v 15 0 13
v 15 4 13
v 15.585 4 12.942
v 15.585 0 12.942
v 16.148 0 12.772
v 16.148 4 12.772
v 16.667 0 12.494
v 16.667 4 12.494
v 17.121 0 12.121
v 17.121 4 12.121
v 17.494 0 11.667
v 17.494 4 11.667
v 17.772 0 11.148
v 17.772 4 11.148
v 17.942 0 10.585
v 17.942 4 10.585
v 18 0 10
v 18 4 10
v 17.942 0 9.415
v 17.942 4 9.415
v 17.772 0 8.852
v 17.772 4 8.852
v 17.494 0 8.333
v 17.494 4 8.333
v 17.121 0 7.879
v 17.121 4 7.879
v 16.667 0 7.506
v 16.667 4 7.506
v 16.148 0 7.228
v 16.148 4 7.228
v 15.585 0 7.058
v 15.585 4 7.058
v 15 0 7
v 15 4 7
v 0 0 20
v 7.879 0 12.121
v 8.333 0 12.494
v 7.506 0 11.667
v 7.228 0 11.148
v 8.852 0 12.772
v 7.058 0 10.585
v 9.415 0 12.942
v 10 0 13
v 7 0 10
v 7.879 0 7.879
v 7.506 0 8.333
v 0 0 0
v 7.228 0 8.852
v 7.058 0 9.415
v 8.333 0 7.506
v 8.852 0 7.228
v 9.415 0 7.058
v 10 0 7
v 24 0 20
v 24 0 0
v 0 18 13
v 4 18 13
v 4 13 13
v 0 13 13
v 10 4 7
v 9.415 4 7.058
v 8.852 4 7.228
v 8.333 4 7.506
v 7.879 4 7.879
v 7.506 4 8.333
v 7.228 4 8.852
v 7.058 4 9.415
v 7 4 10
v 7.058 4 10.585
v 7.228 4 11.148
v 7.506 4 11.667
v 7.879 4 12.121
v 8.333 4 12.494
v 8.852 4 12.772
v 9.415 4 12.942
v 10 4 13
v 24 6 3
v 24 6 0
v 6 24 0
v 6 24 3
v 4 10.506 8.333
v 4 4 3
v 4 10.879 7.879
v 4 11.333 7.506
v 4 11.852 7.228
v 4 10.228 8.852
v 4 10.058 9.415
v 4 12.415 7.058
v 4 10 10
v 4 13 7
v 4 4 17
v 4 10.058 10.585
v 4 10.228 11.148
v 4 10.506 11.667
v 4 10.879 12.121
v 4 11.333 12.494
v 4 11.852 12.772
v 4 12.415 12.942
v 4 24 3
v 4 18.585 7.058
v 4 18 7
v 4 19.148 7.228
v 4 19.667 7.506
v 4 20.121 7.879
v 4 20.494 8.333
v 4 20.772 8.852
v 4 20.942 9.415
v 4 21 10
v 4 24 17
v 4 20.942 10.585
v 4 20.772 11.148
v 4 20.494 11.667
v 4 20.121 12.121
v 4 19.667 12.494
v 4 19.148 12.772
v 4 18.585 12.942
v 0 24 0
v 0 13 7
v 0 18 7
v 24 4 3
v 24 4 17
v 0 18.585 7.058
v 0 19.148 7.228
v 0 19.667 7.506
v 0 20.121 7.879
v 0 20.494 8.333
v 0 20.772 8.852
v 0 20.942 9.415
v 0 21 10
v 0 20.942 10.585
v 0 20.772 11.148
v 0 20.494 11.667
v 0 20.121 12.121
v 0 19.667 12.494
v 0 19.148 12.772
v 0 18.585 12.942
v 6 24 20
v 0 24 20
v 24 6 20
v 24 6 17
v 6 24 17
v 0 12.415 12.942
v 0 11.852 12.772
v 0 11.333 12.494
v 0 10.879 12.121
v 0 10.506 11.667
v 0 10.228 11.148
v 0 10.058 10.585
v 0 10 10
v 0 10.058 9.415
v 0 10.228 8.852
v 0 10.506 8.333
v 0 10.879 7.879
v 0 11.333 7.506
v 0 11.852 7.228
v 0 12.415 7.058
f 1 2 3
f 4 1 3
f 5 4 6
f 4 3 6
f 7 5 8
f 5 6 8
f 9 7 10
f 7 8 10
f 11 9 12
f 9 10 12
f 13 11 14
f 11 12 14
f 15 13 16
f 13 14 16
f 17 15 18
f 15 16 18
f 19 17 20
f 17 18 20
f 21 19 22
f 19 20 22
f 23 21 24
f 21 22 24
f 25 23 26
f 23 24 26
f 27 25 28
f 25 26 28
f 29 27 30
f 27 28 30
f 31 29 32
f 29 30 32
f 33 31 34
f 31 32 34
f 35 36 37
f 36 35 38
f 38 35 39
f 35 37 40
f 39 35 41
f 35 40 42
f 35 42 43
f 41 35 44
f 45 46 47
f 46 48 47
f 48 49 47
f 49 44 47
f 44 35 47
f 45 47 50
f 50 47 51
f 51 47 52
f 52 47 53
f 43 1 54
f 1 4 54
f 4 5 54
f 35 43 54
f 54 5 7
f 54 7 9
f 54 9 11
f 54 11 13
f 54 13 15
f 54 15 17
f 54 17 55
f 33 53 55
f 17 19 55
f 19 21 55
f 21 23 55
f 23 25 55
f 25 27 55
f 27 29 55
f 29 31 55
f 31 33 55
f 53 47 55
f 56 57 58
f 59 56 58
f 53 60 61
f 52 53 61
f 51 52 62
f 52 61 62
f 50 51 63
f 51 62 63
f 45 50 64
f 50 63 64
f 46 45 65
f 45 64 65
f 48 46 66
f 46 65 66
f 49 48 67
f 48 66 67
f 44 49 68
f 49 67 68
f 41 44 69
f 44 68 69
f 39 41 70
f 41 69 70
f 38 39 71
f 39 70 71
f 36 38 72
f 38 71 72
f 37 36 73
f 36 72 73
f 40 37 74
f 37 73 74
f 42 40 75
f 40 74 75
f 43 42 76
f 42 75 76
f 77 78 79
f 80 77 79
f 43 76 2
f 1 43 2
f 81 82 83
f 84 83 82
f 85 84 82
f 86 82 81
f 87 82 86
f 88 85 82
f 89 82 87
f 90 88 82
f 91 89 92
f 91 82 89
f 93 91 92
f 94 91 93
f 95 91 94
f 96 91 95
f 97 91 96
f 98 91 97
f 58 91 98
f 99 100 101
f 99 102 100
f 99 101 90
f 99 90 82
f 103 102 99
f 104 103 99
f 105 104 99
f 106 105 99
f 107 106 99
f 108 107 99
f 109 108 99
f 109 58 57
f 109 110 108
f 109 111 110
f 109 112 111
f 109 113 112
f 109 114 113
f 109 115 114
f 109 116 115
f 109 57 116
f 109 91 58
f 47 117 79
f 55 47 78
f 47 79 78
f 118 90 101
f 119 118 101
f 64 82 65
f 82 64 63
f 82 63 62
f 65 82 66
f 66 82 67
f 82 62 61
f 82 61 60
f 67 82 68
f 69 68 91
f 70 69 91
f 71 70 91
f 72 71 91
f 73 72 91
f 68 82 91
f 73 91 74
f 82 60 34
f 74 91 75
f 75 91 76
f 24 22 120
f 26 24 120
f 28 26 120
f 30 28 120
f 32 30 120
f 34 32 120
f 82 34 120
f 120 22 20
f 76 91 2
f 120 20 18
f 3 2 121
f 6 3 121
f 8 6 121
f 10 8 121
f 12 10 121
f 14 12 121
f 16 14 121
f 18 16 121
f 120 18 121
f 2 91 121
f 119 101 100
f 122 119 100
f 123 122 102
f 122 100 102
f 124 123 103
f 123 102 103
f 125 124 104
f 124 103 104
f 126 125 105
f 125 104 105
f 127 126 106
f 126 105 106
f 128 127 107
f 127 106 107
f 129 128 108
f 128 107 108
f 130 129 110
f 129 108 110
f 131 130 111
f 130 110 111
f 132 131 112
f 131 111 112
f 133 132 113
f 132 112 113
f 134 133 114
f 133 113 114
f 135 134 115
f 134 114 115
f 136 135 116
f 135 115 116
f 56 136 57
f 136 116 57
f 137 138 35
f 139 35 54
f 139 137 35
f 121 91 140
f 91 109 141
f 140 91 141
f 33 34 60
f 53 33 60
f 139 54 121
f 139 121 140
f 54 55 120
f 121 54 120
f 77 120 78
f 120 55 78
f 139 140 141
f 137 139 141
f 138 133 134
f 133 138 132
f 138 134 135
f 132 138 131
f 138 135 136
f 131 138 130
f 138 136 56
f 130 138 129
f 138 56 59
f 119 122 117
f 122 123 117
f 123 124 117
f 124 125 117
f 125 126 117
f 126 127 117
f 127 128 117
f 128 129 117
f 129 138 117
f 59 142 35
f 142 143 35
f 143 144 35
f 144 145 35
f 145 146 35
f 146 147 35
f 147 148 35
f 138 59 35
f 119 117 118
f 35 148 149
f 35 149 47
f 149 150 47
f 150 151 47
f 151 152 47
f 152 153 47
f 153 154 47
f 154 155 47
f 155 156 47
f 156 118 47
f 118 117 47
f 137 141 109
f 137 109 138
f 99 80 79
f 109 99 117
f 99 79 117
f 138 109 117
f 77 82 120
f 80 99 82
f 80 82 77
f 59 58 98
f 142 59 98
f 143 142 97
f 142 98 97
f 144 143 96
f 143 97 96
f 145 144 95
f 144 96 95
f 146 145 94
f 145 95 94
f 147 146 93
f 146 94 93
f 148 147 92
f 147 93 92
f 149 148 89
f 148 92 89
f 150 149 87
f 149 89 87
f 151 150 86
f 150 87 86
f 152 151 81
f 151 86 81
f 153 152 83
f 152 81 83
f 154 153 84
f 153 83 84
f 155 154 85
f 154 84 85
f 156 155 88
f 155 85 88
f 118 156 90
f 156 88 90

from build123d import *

# Parameters (mm, degrees)
EXTRUDE_1_DEPTH     = 20
CUT_EXTRUDE_START   = -3
SKETCH_2_W          = 24
SKETCH_2_H          = 24
CUT_EXTRUDE_1_DEPTH = 14
CUT_EXTRUDE_2_DEPTH = 12
CUT_EXTRUDE_3_DEPTH = 12
SKETCH_5_W          = 6
SKETCH_5_H          = 4
SKETCH_5_W_2        = 4
SKETCH_5_H_2        = 6
CUT_EXTRUDE_4_DEPTH = 30


with BuildPart() as part:
    # 草图1 → 凸台-拉伸1 (new body)
    with BuildSketch(Plane.XY):
        Polygon((0, 28), (0, 0), (28, 0), (28, 6), (24, 6), (6, 24), (6, 28), align=None)
    extrude(amount=EXTRUDE_1_DEPTH)

    # 草图2 → 切除-拉伸1 (cut)
    with BuildSketch(Plane.XY.offset(20).offset(CUT_EXTRUDE_START)):
        with Locations((16, 16)):
            Rectangle(SKETCH_2_W, SKETCH_2_H)
    extrude(amount=-CUT_EXTRUDE_1_DEPTH, mode=Mode.SUBTRACT)

    # 草图3 → 切除-拉伸2 (cut)
    with BuildSketch(Plane(origin=(0, 4, 0), x_dir=(1, 0, 0), z_dir=(0, 1, 0))):
        with BuildLine():
            Line((10, -13), (15, -13))
            ThreePointArc((15, -13), (18, -10), (15, -7))
            Line((15, -7), (10, -7))
            ThreePointArc((10, -7), (7, -10), (10, -13))
        make_face()
    extrude(amount=-CUT_EXTRUDE_2_DEPTH, mode=Mode.SUBTRACT)

    # 草图4 → 切除-拉伸3 (cut)
    with BuildSketch(Plane(origin=(4, 0, 0), x_dir=(0, 0, -1), z_dir=(1, 0, 0))):
        with BuildLine():
            Line((-13, 18), (-13, 13))
            ThreePointArc((-13, 13), (-10, 10), (-7, 13))
            Line((-7, 13), (-7, 18))
            ThreePointArc((-7, 18), (-10, 21), (-13, 18))
        make_face()
    extrude(amount=-CUT_EXTRUDE_3_DEPTH, mode=Mode.SUBTRACT)

    # 草图5 → 切除-拉伸4 (cut)
    with BuildSketch(Plane(origin=(0, 0, 0), x_dir=(-1, 0, 0), z_dir=(0, 0, -1))):
        with Locations((-3, 26)):
            Rectangle(SKETCH_5_W, SKETCH_5_H)
        with Locations((-26, 3)):
            Rectangle(SKETCH_5_W_2, SKETCH_5_H_2)
    extrude(amount=-CUT_EXTRUDE_4_DEPTH, mode=Mode.SUBTRACT)


solid = part.part
